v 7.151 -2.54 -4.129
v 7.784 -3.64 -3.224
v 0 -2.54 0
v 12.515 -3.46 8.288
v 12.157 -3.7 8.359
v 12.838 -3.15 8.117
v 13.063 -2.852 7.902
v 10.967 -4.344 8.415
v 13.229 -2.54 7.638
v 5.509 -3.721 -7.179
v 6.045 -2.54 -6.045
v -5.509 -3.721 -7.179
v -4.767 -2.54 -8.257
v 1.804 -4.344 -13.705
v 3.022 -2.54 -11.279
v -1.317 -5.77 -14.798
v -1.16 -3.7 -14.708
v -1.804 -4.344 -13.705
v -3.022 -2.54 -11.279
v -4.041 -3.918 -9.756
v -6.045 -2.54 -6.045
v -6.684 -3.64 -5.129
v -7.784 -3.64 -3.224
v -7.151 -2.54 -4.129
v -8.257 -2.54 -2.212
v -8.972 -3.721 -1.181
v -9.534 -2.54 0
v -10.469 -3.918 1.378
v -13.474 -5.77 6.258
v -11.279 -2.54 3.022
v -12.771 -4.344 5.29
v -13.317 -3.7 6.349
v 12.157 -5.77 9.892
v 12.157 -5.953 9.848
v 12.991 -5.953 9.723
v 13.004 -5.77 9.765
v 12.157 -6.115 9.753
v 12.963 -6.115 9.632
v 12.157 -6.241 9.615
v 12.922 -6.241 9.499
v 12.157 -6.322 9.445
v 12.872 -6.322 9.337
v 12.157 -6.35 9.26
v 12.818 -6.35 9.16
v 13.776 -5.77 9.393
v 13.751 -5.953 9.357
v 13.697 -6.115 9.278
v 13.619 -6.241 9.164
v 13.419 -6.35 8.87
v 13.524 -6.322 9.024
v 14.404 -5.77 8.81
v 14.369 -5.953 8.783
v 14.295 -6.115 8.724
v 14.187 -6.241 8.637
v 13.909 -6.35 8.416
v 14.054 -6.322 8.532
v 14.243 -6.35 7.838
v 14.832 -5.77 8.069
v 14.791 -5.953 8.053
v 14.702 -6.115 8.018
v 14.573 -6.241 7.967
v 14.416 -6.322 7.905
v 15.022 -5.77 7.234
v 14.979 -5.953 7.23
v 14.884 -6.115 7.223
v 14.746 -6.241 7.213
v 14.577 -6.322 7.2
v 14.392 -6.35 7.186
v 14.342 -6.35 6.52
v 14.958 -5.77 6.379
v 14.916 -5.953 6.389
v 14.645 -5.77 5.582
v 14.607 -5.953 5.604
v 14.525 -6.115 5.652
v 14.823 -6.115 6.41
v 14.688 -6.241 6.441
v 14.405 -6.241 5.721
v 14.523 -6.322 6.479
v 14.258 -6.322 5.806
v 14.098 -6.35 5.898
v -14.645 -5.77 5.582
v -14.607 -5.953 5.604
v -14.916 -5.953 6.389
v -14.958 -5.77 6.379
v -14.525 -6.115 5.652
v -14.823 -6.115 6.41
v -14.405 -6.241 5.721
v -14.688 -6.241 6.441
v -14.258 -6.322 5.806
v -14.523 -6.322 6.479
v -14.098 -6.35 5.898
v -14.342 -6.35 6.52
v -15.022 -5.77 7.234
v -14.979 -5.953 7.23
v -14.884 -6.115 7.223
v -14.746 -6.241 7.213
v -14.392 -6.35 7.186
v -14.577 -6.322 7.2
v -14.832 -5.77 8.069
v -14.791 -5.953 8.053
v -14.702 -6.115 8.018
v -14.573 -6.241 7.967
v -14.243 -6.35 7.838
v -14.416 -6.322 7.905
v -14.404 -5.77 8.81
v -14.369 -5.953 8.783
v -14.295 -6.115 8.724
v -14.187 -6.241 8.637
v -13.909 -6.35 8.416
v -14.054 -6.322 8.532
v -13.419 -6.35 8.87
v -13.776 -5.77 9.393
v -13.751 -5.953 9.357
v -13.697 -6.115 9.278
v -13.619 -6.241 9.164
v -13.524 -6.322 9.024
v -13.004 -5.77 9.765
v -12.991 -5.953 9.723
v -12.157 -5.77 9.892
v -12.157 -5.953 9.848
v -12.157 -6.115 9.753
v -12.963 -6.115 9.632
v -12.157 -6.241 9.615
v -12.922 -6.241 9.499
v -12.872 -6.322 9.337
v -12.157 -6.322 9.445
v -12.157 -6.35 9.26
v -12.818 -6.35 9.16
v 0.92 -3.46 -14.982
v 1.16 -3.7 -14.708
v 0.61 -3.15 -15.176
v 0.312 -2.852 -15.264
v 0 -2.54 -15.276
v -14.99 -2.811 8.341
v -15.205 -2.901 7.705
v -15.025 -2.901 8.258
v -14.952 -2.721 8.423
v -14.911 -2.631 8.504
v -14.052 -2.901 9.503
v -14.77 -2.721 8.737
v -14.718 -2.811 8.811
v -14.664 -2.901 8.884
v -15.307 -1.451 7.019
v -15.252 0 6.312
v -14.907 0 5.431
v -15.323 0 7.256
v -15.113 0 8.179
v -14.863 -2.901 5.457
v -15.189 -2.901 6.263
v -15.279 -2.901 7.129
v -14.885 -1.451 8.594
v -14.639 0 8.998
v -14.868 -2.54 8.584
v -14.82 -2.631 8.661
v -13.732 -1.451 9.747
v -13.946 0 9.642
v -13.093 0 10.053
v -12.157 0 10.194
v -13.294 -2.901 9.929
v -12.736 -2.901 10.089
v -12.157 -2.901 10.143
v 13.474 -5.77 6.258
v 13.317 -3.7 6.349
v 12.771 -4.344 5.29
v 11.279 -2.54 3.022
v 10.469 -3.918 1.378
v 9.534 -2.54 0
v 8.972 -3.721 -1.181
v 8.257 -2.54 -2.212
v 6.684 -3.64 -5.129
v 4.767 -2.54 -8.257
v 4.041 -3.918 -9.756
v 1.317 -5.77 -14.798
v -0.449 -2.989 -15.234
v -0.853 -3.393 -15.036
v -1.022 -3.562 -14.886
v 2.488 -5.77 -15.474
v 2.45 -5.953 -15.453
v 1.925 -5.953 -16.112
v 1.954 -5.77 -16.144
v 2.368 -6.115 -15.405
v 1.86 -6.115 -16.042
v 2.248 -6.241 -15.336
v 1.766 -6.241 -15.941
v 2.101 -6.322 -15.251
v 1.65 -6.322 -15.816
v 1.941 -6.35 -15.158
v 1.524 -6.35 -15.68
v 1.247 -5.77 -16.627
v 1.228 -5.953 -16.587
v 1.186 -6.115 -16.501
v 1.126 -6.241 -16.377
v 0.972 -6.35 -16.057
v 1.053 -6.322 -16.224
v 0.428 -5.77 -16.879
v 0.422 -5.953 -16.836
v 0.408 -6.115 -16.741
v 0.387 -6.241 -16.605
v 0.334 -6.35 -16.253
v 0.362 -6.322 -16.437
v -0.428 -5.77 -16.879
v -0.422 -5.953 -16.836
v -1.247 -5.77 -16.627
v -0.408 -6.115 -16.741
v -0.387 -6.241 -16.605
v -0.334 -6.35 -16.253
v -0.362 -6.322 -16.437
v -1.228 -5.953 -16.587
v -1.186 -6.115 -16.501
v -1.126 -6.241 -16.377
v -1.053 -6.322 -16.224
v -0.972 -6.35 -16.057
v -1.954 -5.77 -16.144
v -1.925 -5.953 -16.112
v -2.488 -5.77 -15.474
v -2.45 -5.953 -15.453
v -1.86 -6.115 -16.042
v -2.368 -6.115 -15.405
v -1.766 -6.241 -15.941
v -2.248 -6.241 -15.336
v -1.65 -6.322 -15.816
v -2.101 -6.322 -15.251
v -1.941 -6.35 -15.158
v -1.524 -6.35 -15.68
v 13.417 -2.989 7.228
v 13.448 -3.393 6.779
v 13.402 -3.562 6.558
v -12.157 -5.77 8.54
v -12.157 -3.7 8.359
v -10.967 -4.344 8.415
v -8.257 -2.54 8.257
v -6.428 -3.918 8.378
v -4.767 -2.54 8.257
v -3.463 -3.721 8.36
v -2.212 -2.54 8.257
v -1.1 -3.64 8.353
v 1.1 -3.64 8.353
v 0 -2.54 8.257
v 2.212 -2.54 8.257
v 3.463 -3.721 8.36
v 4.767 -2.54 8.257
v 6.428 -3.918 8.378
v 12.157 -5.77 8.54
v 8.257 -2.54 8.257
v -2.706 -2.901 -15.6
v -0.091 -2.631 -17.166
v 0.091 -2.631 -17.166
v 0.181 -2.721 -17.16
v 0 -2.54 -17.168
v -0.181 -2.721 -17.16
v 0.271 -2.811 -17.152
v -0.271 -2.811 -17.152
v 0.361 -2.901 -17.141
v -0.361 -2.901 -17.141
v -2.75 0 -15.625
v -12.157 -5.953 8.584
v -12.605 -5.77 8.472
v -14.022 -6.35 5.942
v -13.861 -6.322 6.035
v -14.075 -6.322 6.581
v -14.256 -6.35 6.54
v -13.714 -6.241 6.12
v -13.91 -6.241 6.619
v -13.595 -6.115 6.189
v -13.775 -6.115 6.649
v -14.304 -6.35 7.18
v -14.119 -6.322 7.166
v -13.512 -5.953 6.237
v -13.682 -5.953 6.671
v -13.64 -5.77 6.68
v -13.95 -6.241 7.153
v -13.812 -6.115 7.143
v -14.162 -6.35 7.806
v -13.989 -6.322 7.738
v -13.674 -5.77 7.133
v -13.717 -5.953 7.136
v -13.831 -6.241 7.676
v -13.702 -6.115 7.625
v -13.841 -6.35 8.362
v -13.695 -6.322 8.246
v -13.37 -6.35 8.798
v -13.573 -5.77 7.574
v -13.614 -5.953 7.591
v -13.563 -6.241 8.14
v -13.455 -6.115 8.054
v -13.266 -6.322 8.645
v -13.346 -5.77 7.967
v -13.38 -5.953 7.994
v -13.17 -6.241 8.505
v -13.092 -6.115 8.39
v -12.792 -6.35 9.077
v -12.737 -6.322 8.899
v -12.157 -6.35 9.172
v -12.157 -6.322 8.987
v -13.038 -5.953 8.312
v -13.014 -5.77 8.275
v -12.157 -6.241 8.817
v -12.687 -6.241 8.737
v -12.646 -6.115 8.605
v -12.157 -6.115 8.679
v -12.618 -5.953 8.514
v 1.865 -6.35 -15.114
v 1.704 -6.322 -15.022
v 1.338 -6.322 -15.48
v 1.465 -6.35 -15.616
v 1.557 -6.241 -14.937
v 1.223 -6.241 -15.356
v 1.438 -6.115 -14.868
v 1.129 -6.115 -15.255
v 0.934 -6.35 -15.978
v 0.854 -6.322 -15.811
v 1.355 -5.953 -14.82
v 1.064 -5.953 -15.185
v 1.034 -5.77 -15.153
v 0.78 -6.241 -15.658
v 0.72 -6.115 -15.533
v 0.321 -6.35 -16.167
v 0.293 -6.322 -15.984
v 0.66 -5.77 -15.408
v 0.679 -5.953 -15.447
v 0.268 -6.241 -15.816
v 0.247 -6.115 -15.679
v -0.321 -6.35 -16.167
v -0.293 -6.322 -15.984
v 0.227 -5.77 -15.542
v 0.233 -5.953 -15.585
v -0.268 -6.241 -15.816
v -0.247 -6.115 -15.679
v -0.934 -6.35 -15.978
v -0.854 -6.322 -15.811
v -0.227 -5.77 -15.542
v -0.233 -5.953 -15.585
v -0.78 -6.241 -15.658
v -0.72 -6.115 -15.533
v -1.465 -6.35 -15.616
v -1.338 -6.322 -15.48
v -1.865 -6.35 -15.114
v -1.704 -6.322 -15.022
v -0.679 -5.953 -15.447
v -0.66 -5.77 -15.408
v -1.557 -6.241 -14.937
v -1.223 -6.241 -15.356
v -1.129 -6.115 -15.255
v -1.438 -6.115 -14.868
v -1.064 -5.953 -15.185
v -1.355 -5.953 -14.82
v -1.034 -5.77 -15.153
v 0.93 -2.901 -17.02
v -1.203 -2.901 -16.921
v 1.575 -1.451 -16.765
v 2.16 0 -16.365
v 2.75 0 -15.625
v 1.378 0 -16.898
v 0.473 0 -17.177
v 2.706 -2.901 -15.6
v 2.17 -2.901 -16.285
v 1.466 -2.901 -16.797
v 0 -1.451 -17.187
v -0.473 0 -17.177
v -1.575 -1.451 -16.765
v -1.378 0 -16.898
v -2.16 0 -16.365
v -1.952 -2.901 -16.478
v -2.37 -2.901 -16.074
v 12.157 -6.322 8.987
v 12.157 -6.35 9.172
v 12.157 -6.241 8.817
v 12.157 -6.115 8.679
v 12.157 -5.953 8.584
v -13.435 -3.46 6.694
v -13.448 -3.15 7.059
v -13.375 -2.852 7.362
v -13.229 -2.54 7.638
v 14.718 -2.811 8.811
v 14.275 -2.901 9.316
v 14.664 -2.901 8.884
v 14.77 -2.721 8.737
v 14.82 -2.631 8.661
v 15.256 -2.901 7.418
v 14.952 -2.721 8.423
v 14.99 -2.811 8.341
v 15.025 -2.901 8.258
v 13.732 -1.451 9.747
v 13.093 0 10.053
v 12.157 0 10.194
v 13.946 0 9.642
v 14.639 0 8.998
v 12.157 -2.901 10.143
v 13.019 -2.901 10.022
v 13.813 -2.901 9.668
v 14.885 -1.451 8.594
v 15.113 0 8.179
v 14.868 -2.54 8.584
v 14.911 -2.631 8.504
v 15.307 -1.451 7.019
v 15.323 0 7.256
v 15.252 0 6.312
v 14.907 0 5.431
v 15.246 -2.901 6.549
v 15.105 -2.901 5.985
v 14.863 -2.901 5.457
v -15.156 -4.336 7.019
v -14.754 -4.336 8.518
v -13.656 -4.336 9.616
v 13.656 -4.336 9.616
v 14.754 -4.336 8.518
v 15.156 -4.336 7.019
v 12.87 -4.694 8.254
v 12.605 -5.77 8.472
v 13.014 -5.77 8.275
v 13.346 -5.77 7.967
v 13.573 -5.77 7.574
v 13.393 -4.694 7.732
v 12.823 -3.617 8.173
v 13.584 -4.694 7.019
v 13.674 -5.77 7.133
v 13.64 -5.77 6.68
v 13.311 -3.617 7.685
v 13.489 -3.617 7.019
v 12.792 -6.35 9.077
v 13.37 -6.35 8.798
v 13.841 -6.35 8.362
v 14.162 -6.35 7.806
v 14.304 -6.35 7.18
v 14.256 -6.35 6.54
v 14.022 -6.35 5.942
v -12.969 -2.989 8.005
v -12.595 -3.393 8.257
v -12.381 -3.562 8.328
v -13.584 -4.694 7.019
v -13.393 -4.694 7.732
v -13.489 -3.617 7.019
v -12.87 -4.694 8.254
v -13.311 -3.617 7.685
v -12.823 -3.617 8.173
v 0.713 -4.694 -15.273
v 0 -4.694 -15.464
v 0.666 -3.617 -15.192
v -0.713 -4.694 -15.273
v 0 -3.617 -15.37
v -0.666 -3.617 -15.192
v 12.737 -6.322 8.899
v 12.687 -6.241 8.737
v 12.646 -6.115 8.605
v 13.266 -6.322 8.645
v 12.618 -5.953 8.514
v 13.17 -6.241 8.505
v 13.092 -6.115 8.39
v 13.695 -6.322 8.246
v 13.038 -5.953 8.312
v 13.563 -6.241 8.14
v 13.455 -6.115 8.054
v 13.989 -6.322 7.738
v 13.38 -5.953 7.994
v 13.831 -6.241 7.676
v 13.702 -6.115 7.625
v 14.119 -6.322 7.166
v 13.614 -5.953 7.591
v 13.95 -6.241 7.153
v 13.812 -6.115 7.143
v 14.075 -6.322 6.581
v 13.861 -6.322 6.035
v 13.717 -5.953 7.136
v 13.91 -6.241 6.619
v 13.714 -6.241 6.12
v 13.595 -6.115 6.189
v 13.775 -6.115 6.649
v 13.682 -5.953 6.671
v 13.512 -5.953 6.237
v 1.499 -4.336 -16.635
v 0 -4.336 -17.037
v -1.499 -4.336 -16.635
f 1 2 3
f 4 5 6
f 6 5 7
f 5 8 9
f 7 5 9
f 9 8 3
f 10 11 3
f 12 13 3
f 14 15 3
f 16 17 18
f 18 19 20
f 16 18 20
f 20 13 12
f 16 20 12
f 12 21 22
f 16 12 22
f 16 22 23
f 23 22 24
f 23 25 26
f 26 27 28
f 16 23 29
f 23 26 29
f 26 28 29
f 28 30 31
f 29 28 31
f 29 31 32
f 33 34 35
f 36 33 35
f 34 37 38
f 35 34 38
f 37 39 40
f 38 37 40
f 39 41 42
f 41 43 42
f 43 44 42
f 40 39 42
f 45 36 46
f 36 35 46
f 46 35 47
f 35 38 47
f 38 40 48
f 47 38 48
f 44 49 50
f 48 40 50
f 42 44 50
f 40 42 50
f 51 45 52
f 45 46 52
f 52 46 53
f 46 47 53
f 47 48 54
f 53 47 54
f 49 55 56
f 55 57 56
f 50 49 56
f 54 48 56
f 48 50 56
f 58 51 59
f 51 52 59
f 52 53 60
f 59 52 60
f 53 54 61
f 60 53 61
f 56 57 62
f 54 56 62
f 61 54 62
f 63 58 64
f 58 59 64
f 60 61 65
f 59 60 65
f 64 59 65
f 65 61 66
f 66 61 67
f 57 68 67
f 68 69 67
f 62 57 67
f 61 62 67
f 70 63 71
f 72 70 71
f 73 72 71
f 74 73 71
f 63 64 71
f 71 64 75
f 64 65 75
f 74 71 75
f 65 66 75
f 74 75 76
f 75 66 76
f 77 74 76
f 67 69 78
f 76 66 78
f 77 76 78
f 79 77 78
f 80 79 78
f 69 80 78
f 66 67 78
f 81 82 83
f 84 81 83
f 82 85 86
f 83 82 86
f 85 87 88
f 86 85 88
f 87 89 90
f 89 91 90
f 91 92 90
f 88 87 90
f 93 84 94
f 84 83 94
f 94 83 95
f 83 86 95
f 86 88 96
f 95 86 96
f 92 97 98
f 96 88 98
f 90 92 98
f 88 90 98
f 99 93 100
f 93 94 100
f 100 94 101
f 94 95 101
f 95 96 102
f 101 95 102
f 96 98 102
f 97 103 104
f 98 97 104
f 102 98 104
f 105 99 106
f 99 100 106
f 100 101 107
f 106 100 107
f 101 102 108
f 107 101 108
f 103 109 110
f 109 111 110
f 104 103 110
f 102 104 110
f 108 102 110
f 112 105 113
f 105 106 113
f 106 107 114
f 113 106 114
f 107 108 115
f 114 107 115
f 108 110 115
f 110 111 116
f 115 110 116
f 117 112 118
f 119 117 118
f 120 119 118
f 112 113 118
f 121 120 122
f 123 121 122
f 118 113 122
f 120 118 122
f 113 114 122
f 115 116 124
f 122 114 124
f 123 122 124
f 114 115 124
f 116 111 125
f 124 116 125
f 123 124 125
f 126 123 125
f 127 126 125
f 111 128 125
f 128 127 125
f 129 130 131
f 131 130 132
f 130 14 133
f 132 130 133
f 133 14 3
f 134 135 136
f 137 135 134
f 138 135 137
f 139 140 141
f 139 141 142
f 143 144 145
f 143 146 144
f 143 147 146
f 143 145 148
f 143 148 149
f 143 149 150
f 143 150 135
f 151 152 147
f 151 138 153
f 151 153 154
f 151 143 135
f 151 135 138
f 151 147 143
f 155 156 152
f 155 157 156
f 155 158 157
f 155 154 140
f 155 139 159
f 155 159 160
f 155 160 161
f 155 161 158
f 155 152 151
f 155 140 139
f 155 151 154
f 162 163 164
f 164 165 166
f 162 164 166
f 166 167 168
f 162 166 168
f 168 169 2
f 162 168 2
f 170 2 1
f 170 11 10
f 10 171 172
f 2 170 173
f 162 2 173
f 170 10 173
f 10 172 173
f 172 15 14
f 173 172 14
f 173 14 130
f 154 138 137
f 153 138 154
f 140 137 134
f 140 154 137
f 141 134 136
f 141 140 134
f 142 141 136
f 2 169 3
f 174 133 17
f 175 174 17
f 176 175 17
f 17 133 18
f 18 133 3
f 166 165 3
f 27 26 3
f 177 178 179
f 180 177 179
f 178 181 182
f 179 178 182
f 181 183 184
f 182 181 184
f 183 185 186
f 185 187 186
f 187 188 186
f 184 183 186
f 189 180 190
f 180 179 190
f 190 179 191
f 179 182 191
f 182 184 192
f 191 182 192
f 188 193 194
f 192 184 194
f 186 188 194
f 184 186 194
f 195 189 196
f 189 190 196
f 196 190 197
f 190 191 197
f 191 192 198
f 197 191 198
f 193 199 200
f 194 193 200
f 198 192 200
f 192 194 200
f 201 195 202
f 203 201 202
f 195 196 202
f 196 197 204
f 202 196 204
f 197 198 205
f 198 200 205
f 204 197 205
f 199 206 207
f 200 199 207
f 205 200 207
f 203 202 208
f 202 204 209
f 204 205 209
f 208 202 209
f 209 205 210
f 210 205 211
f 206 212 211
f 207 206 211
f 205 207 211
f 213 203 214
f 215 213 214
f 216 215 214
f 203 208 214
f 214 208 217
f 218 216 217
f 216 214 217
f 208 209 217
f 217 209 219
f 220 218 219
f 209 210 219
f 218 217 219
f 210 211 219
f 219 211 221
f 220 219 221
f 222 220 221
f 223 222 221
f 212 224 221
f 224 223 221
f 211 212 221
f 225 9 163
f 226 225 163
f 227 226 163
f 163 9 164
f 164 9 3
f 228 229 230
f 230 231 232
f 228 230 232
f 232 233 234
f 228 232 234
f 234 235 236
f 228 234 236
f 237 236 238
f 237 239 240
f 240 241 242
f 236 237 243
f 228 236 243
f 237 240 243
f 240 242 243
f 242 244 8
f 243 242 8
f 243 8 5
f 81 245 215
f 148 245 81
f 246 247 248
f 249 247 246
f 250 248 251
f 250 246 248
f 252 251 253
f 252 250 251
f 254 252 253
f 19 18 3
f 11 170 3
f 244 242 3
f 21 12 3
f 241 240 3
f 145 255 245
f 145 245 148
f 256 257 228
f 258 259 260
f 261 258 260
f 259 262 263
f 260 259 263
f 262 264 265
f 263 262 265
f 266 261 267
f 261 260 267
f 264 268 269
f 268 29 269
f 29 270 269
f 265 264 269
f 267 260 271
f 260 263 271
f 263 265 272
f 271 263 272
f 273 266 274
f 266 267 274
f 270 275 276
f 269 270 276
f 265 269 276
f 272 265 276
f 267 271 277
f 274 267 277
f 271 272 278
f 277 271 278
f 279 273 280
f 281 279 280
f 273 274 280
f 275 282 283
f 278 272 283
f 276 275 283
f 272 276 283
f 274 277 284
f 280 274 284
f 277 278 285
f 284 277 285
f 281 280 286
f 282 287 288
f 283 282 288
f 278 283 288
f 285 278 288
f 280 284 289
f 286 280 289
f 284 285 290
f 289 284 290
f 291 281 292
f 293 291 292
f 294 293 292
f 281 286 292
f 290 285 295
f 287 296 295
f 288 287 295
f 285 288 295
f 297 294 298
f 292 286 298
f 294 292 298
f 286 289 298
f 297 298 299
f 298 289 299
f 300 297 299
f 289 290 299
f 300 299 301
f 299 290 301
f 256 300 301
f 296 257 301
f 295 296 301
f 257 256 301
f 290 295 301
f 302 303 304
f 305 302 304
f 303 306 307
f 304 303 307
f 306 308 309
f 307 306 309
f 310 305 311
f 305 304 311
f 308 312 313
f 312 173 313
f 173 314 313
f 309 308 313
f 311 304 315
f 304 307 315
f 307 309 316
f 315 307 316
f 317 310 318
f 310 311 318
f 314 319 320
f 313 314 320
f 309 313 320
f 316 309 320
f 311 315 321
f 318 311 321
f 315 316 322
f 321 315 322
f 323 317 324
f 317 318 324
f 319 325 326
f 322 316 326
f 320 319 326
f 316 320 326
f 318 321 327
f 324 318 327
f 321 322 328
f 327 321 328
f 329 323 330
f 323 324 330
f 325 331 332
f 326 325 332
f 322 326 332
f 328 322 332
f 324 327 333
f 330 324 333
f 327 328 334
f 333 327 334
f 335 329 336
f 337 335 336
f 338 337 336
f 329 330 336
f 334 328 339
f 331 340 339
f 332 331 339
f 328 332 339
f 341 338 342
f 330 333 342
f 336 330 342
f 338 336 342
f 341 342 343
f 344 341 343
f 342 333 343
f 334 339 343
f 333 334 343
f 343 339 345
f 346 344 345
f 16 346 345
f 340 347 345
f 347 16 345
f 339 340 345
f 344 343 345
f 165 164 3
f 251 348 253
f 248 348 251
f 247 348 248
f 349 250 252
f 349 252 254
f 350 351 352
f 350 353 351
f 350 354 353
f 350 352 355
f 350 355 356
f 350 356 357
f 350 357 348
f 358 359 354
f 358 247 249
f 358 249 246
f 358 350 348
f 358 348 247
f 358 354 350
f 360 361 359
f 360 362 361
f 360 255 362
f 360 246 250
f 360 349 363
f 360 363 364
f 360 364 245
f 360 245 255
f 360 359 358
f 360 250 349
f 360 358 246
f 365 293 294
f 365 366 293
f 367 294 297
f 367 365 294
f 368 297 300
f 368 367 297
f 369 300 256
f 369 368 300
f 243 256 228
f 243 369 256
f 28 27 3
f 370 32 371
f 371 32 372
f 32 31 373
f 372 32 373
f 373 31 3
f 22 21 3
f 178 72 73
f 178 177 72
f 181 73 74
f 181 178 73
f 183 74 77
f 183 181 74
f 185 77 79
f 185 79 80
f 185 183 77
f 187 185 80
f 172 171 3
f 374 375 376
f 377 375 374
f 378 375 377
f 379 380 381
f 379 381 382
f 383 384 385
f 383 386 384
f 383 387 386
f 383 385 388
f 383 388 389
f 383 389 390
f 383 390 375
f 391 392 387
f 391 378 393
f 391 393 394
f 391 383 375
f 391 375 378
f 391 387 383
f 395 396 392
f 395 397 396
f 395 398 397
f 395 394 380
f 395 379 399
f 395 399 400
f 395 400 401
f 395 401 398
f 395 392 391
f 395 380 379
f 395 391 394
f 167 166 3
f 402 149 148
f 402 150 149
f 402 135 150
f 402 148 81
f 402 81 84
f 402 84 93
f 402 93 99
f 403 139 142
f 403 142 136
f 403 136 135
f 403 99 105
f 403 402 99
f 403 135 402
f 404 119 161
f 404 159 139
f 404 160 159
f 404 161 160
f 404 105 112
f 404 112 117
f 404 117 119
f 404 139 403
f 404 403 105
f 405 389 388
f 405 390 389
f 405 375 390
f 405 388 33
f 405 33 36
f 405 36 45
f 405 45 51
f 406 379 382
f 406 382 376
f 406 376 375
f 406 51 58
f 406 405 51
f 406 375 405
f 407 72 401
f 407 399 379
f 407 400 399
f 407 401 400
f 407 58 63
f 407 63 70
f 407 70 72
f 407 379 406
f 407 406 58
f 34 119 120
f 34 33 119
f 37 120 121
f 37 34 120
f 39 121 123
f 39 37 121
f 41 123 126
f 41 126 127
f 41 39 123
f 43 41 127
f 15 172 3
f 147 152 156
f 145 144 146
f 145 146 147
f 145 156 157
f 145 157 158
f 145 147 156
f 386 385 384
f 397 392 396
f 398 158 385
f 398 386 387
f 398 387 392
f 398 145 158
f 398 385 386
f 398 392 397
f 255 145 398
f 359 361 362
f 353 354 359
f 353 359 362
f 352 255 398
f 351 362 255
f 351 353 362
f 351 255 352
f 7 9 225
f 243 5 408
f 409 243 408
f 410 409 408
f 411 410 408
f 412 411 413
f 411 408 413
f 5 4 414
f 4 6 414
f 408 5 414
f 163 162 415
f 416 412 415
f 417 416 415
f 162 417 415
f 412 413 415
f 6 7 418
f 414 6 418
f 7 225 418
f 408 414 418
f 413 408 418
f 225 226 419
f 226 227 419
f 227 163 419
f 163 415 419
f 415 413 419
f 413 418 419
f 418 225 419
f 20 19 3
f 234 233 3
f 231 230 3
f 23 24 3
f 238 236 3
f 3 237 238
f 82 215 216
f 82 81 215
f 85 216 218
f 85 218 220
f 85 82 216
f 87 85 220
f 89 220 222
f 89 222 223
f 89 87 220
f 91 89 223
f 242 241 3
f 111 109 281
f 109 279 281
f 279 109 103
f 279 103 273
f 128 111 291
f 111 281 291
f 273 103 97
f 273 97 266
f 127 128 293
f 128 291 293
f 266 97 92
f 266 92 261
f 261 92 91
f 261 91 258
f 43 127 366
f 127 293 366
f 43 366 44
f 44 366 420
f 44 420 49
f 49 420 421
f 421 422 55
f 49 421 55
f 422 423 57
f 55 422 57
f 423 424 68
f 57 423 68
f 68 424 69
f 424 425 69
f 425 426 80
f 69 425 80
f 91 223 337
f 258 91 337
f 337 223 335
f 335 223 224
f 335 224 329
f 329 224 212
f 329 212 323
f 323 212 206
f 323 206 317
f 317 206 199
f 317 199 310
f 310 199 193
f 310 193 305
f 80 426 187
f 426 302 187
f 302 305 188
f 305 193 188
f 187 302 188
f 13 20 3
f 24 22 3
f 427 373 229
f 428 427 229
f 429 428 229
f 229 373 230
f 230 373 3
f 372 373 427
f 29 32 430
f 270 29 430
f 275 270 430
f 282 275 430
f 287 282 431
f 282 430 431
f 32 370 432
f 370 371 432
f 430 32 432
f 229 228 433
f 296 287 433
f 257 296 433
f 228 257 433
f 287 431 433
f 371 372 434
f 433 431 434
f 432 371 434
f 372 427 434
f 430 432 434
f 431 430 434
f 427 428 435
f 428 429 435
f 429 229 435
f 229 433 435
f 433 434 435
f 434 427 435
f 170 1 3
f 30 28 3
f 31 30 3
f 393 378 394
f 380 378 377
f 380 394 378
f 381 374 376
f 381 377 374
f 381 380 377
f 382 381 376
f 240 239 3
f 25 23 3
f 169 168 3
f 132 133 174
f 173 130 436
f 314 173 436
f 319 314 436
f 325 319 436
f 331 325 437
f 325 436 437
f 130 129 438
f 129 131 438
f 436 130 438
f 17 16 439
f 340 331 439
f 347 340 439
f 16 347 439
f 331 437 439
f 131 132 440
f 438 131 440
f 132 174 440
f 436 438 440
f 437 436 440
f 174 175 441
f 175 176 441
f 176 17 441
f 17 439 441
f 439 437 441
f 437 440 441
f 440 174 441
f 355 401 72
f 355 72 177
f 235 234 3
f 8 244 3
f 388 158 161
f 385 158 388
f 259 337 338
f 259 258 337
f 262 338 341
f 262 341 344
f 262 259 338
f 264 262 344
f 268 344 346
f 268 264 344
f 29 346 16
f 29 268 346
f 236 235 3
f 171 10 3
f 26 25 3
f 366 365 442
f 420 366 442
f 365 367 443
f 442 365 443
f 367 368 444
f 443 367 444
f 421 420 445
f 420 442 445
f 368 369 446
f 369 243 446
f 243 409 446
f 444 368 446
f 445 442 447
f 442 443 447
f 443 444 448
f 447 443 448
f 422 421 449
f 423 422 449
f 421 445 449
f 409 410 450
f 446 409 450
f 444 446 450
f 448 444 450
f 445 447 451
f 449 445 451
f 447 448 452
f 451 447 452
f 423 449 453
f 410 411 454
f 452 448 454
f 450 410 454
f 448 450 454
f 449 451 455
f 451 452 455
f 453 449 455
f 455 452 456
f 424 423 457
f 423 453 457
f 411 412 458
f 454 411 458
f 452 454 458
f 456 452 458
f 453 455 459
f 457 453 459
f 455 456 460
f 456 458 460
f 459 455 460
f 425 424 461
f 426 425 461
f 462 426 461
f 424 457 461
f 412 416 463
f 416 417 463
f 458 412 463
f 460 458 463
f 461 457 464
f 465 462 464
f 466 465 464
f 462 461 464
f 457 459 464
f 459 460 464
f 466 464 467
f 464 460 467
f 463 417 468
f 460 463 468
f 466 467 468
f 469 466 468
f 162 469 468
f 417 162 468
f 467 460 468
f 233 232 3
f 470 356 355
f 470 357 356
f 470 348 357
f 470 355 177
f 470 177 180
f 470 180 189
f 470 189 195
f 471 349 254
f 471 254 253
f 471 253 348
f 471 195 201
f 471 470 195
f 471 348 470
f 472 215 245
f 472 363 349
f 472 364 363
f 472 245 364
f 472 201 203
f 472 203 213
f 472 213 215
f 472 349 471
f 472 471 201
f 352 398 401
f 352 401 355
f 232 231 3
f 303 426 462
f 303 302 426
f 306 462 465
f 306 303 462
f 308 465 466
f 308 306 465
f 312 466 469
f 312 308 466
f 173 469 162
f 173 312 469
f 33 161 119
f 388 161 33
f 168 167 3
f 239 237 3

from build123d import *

# Parameters (mm, degrees)
BOSS_EXTRUDE1_DEPTH = 6.35
BOSS_EXTRUDE1_DRAFT = -1
CUT_EXTRUDE3_DEPTH  = 24.909662179
CIRPATTERN3_COUNT   = 24
BOSS_EXTRUDE3_DEPTH = 6.35
BOSS_EXTRUDE3_DRAFT = -1
SKETCH8_OUTSIDE_W   = 45.346
SKETCH8_OUTSIDE_H   = 42.089
CUT_EXTRUDE4_DEPTH  = 24.909662179
CUT_EXTRUDE4_DRAFT  = 5
DRAFT2_ANGLE        = -5
FILLET2_R           = 0.635


with BuildPart() as part:
    # Sketch1 → Boss-Extrude1 (with draft: the straight prism first)
    with BuildSketch(Plane(origin=(0, 0, 0), x_dir=(1, 0, 0), z_dir=(0, 1, 0))):
        with BuildLine():
            Line((-2.749630657, 15.625233333), (-14.906664335, -5.431366667))
            ThreePointArc((-14.906664335, -5.431366667), (-14.906664335, -8.606366667), (-12.157033678, -10.193866667))
            Line((-12.157033678, -10.193866667), (12.157033678, -10.193866667))
            ThreePointArc((12.157033678, -10.193866667), (14.906664335, -8.606366667), (14.906664335, -5.431366667))
            Line((14.906664335, -5.431366667), (2.749630657, 15.625233333))
            ThreePointArc((2.749630657, 15.625233333), (0, 17.212733333), (-2.749630657, 15.625233333))
        make_face()
    extrude(amount=-BOSS_EXTRUDE1_DEPTH)
    # Boss-Extrude1: the draft: its side faces are tilted about the plane it starts from
    boss_extrude1_sides = [part.faces().sort_by_distance(p)[0] for p in [
        (8.828147496, -3.175, -5.096933333),
        (0, -3.175, -17.212733333),
        (-8.828147496, -3.175, -5.096933333),
        (-14.906664335, -3.175, 8.606366667),
        (0, -3.175, 10.193866667),
        (14.906664335, -3.175, 8.606366667),
    ]]
    draft(boss_extrude1_sides, Plane(origin=(0, 0, 0), x_dir=(1, 0, 0), z_dir=(0, 1, 0)), BOSS_EXTRUDE1_DRAFT)

    # Sketch6 → Cut-Extrude3 (cut, through all)
    with BuildSketch(Plane.XY):
        Polygon((0, -2.54), (-6.985, -9.525), (6.985, -9.525), align=None)
    cut_extrude3 = extrude(amount=-CUT_EXTRUDE3_DEPTH, mode=Mode.SUBTRACT)

    # CirPattern3: Cut-Extrude3 ×24 about axis
    cirpattern3_axis = Axis((0, 0, 0), (0, 1, 0))
    for i in range(1, CIRPATTERN3_COUNT):
        add(cut_extrude3.rotate(cirpattern3_axis, i * 360 / CIRPATTERN3_COUNT), mode=Mode.SUBTRACT)


with BuildPart() as boss_extrude3_tool:
    # Sketch7 → Boss-Extrude3 (with draft: the straight prism first)
    with BuildSketch(Plane(origin=(0, 0, 0), x_dir=(1, 0, 0), z_dir=(0, 1, 0))):
        with BuildLine():
            Line((-12.157033678, -10.193866667), (12.157033678, -10.193866667))
            ThreePointArc((12.157033678, -10.193866667), (14.906664335, -8.606366667), (14.906664335, -5.431366667))
            Line((14.906664335, -5.431366667), (2.749630657, 15.625233333))
            ThreePointArc((2.749630657, 15.625233333), (0, 17.212733333), (-2.749630657, 15.625233333))
            Line((-2.749630657, 15.625233333), (-14.906664335, -5.431366667))
            ThreePointArc((-14.906664335, -5.431366667), (-14.906664335, -8.606366667), (-12.157033678, -10.193866667))
        make_face()
        with BuildLine():
            Line((-12.157033678, -8.034866667), (12.157033678, -8.034866667))
            ThreePointArc((12.157033678, -8.034866667), (13.036915488, -7.526866667), (13.036915488, -6.510866667))
            Line((13.036915488, -6.510866667), (0.87988181, 14.545733333))
            ThreePointArc((0.87988181, 14.545733333), (0, 15.053733333), (-0.87988181, 14.545733333))
            Line((-0.87988181, 14.545733333), (-13.036915488, -6.510866667))
            ThreePointArc((-13.036915488, -6.510866667), (-13.036915488, -7.526866667), (-12.157033678, -8.034866667))
        make_face(mode=Mode.SUBTRACT)
    extrude(amount=-BOSS_EXTRUDE3_DEPTH)
    # Boss-Extrude3: the draft: its side faces are tilted about the plane it starts from
    boss_extrude3_sides = [boss_extrude3_tool.faces().sort_by_distance(p)[0] for p in [
        (0, -3.175, 10.193866667),
        (14.906664335, -3.175, 8.606366667),
        (8.828147496, -3.175, -5.096933333),
        (0, -3.175, -17.212733333),
        (-8.828147496, -3.175, -5.096933333),
        (-14.906664335, -3.175, 8.606366667),
        (-13.036915488, -3.175, 7.526866667),
        (-6.958398649, -3.175, -4.017433333),
        (0, -3.175, -15.053733333),
        (6.958398649, -3.175, -4.017433333),
        (13.036915488, -3.175, 7.526866667),
        (0, -3.175, 8.034866667),
    ]]
    draft(boss_extrude3_sides, Plane(origin=(0, 0, 0), x_dir=(1, 0, 0), z_dir=(0, 1, 0)), BOSS_EXTRUDE3_DRAFT)


with BuildPart() as part_1:
    add(part.part)

    # Boss-Extrude3: add boss_extrude3_tool
    add(boss_extrude3_tool.part)


with BuildPart() as cut_extrude4_tool:
    # Sketch8 outside → Cut-Extrude4 (with draft: the straight prism first)
    with BuildSketch(Plane(origin=(0, 0, 0), x_dir=(1, 0, 0), z_dir=(0, 1, 0))):
        with Locations((0, 3.5095)):
            Rectangle(SKETCH8_OUTSIDE_W, SKETCH8_OUTSIDE_H)
        with BuildLine():
            Line((-12.157033678, -10.397066667), (12.157033678, -10.397066667))
            ThreePointArc((12.157033678, -10.397066667), (15.082640697, -8.707966667), (15.082640697, -5.329766667))
            Line((15.082640697, -5.329766667), (2.925607019, 15.726833333))
            ThreePointArc((2.925607019, 15.726833333), (0, 17.415933333), (-2.925607019, 15.726833333))
            Line((-2.925607019, 15.726833333), (-15.082640697, -5.329766667))
            ThreePointArc((-15.082640697, -5.329766667), (-15.082640697, -8.707966667), (-12.157033678, -10.397066667))
        make_face(mode=Mode.SUBTRACT)
    extrude(amount=-CUT_EXTRUDE4_DEPTH)
    # Cut-Extrude4: the draft: its side faces are tilted about the plane it starts from
    cut_extrude4_sides = [cut_extrude4_tool.faces().sort_by_distance(p)[0] for p in [
        (0, -12.45483109, 17.535),
        (22.673, -12.45483109, -3.5095),
        (0, -12.45483109, -24.554),
        (-22.673, -12.45483109, -3.5095),
        (-9.004123858, -12.45483109, -5.198533333),
        (0, -12.45483109, -17.415933333),
        (9.004123858, -12.45483109, -5.198533333),
        (15.082640697, -12.45483109, 8.707966667),
        (0, -12.45483109, 10.397066667),
        (-15.082640697, -12.45483109, 8.707966667),
    ]]
    draft(cut_extrude4_sides, Plane(origin=(0, 0, 0), x_dir=(1, 0, 0), z_dir=(0, 1, 0)), CUT_EXTRUDE4_DRAFT)


with BuildPart() as part_2:
    add(part_1.part)

    # Cut-Extrude4: cut by cut_extrude4_tool
    add(cut_extrude4_tool.part, mode=Mode.SUBTRACT)

    # Draft2
    draft2_faces = [part_2.faces().sort_by_distance(p)[0] for p in [
        (-13.104108463, -4.445, 7.565660548),
        (-7.03077319, -4.787774892, -4.059218794),
        (0, -4.445, -15.131321097),
        (7.03077319, -4.787774892, -4.059218794),
        (13.104108463, -4.445, 7.565660548),
        (0, -4.787774892, 8.118437588),
    ]]
    draft(draft2_faces, Plane(origin=(-12.157033678, 0, 7.018866667), x_dir=(0, 0, 1), z_dir=(0, 1, 0)), DRAFT2_ANGLE)

    # Fillet2
    fillet2_edges = [part_2.edges().sort_by_distance(p)[0] for p in [
        (-7.439521672, -6.35, -4.29520984),
        (-13.518038511, -6.35, 7.804643173),
        (0, -6.35, 8.59041968),
        (13.518038511, -6.35, 7.804643173),
        (7.439521672, -6.35, -4.29520984),
        (0, -6.35, -15.609286347),
        (-8.523000835, -6.35, -4.920756827),
        (-14.601517675, -6.35, 8.43019016),
        (0, -6.35, 9.841513653),
        (14.601517675, -6.35, 8.43019016),
        (8.523000835, -6.35, -4.920756827),
        (0, -6.35, -16.86038032),
    ]]
    fillet(fillet2_edges, radius=FILLET2_R)


solid = part_2.part
